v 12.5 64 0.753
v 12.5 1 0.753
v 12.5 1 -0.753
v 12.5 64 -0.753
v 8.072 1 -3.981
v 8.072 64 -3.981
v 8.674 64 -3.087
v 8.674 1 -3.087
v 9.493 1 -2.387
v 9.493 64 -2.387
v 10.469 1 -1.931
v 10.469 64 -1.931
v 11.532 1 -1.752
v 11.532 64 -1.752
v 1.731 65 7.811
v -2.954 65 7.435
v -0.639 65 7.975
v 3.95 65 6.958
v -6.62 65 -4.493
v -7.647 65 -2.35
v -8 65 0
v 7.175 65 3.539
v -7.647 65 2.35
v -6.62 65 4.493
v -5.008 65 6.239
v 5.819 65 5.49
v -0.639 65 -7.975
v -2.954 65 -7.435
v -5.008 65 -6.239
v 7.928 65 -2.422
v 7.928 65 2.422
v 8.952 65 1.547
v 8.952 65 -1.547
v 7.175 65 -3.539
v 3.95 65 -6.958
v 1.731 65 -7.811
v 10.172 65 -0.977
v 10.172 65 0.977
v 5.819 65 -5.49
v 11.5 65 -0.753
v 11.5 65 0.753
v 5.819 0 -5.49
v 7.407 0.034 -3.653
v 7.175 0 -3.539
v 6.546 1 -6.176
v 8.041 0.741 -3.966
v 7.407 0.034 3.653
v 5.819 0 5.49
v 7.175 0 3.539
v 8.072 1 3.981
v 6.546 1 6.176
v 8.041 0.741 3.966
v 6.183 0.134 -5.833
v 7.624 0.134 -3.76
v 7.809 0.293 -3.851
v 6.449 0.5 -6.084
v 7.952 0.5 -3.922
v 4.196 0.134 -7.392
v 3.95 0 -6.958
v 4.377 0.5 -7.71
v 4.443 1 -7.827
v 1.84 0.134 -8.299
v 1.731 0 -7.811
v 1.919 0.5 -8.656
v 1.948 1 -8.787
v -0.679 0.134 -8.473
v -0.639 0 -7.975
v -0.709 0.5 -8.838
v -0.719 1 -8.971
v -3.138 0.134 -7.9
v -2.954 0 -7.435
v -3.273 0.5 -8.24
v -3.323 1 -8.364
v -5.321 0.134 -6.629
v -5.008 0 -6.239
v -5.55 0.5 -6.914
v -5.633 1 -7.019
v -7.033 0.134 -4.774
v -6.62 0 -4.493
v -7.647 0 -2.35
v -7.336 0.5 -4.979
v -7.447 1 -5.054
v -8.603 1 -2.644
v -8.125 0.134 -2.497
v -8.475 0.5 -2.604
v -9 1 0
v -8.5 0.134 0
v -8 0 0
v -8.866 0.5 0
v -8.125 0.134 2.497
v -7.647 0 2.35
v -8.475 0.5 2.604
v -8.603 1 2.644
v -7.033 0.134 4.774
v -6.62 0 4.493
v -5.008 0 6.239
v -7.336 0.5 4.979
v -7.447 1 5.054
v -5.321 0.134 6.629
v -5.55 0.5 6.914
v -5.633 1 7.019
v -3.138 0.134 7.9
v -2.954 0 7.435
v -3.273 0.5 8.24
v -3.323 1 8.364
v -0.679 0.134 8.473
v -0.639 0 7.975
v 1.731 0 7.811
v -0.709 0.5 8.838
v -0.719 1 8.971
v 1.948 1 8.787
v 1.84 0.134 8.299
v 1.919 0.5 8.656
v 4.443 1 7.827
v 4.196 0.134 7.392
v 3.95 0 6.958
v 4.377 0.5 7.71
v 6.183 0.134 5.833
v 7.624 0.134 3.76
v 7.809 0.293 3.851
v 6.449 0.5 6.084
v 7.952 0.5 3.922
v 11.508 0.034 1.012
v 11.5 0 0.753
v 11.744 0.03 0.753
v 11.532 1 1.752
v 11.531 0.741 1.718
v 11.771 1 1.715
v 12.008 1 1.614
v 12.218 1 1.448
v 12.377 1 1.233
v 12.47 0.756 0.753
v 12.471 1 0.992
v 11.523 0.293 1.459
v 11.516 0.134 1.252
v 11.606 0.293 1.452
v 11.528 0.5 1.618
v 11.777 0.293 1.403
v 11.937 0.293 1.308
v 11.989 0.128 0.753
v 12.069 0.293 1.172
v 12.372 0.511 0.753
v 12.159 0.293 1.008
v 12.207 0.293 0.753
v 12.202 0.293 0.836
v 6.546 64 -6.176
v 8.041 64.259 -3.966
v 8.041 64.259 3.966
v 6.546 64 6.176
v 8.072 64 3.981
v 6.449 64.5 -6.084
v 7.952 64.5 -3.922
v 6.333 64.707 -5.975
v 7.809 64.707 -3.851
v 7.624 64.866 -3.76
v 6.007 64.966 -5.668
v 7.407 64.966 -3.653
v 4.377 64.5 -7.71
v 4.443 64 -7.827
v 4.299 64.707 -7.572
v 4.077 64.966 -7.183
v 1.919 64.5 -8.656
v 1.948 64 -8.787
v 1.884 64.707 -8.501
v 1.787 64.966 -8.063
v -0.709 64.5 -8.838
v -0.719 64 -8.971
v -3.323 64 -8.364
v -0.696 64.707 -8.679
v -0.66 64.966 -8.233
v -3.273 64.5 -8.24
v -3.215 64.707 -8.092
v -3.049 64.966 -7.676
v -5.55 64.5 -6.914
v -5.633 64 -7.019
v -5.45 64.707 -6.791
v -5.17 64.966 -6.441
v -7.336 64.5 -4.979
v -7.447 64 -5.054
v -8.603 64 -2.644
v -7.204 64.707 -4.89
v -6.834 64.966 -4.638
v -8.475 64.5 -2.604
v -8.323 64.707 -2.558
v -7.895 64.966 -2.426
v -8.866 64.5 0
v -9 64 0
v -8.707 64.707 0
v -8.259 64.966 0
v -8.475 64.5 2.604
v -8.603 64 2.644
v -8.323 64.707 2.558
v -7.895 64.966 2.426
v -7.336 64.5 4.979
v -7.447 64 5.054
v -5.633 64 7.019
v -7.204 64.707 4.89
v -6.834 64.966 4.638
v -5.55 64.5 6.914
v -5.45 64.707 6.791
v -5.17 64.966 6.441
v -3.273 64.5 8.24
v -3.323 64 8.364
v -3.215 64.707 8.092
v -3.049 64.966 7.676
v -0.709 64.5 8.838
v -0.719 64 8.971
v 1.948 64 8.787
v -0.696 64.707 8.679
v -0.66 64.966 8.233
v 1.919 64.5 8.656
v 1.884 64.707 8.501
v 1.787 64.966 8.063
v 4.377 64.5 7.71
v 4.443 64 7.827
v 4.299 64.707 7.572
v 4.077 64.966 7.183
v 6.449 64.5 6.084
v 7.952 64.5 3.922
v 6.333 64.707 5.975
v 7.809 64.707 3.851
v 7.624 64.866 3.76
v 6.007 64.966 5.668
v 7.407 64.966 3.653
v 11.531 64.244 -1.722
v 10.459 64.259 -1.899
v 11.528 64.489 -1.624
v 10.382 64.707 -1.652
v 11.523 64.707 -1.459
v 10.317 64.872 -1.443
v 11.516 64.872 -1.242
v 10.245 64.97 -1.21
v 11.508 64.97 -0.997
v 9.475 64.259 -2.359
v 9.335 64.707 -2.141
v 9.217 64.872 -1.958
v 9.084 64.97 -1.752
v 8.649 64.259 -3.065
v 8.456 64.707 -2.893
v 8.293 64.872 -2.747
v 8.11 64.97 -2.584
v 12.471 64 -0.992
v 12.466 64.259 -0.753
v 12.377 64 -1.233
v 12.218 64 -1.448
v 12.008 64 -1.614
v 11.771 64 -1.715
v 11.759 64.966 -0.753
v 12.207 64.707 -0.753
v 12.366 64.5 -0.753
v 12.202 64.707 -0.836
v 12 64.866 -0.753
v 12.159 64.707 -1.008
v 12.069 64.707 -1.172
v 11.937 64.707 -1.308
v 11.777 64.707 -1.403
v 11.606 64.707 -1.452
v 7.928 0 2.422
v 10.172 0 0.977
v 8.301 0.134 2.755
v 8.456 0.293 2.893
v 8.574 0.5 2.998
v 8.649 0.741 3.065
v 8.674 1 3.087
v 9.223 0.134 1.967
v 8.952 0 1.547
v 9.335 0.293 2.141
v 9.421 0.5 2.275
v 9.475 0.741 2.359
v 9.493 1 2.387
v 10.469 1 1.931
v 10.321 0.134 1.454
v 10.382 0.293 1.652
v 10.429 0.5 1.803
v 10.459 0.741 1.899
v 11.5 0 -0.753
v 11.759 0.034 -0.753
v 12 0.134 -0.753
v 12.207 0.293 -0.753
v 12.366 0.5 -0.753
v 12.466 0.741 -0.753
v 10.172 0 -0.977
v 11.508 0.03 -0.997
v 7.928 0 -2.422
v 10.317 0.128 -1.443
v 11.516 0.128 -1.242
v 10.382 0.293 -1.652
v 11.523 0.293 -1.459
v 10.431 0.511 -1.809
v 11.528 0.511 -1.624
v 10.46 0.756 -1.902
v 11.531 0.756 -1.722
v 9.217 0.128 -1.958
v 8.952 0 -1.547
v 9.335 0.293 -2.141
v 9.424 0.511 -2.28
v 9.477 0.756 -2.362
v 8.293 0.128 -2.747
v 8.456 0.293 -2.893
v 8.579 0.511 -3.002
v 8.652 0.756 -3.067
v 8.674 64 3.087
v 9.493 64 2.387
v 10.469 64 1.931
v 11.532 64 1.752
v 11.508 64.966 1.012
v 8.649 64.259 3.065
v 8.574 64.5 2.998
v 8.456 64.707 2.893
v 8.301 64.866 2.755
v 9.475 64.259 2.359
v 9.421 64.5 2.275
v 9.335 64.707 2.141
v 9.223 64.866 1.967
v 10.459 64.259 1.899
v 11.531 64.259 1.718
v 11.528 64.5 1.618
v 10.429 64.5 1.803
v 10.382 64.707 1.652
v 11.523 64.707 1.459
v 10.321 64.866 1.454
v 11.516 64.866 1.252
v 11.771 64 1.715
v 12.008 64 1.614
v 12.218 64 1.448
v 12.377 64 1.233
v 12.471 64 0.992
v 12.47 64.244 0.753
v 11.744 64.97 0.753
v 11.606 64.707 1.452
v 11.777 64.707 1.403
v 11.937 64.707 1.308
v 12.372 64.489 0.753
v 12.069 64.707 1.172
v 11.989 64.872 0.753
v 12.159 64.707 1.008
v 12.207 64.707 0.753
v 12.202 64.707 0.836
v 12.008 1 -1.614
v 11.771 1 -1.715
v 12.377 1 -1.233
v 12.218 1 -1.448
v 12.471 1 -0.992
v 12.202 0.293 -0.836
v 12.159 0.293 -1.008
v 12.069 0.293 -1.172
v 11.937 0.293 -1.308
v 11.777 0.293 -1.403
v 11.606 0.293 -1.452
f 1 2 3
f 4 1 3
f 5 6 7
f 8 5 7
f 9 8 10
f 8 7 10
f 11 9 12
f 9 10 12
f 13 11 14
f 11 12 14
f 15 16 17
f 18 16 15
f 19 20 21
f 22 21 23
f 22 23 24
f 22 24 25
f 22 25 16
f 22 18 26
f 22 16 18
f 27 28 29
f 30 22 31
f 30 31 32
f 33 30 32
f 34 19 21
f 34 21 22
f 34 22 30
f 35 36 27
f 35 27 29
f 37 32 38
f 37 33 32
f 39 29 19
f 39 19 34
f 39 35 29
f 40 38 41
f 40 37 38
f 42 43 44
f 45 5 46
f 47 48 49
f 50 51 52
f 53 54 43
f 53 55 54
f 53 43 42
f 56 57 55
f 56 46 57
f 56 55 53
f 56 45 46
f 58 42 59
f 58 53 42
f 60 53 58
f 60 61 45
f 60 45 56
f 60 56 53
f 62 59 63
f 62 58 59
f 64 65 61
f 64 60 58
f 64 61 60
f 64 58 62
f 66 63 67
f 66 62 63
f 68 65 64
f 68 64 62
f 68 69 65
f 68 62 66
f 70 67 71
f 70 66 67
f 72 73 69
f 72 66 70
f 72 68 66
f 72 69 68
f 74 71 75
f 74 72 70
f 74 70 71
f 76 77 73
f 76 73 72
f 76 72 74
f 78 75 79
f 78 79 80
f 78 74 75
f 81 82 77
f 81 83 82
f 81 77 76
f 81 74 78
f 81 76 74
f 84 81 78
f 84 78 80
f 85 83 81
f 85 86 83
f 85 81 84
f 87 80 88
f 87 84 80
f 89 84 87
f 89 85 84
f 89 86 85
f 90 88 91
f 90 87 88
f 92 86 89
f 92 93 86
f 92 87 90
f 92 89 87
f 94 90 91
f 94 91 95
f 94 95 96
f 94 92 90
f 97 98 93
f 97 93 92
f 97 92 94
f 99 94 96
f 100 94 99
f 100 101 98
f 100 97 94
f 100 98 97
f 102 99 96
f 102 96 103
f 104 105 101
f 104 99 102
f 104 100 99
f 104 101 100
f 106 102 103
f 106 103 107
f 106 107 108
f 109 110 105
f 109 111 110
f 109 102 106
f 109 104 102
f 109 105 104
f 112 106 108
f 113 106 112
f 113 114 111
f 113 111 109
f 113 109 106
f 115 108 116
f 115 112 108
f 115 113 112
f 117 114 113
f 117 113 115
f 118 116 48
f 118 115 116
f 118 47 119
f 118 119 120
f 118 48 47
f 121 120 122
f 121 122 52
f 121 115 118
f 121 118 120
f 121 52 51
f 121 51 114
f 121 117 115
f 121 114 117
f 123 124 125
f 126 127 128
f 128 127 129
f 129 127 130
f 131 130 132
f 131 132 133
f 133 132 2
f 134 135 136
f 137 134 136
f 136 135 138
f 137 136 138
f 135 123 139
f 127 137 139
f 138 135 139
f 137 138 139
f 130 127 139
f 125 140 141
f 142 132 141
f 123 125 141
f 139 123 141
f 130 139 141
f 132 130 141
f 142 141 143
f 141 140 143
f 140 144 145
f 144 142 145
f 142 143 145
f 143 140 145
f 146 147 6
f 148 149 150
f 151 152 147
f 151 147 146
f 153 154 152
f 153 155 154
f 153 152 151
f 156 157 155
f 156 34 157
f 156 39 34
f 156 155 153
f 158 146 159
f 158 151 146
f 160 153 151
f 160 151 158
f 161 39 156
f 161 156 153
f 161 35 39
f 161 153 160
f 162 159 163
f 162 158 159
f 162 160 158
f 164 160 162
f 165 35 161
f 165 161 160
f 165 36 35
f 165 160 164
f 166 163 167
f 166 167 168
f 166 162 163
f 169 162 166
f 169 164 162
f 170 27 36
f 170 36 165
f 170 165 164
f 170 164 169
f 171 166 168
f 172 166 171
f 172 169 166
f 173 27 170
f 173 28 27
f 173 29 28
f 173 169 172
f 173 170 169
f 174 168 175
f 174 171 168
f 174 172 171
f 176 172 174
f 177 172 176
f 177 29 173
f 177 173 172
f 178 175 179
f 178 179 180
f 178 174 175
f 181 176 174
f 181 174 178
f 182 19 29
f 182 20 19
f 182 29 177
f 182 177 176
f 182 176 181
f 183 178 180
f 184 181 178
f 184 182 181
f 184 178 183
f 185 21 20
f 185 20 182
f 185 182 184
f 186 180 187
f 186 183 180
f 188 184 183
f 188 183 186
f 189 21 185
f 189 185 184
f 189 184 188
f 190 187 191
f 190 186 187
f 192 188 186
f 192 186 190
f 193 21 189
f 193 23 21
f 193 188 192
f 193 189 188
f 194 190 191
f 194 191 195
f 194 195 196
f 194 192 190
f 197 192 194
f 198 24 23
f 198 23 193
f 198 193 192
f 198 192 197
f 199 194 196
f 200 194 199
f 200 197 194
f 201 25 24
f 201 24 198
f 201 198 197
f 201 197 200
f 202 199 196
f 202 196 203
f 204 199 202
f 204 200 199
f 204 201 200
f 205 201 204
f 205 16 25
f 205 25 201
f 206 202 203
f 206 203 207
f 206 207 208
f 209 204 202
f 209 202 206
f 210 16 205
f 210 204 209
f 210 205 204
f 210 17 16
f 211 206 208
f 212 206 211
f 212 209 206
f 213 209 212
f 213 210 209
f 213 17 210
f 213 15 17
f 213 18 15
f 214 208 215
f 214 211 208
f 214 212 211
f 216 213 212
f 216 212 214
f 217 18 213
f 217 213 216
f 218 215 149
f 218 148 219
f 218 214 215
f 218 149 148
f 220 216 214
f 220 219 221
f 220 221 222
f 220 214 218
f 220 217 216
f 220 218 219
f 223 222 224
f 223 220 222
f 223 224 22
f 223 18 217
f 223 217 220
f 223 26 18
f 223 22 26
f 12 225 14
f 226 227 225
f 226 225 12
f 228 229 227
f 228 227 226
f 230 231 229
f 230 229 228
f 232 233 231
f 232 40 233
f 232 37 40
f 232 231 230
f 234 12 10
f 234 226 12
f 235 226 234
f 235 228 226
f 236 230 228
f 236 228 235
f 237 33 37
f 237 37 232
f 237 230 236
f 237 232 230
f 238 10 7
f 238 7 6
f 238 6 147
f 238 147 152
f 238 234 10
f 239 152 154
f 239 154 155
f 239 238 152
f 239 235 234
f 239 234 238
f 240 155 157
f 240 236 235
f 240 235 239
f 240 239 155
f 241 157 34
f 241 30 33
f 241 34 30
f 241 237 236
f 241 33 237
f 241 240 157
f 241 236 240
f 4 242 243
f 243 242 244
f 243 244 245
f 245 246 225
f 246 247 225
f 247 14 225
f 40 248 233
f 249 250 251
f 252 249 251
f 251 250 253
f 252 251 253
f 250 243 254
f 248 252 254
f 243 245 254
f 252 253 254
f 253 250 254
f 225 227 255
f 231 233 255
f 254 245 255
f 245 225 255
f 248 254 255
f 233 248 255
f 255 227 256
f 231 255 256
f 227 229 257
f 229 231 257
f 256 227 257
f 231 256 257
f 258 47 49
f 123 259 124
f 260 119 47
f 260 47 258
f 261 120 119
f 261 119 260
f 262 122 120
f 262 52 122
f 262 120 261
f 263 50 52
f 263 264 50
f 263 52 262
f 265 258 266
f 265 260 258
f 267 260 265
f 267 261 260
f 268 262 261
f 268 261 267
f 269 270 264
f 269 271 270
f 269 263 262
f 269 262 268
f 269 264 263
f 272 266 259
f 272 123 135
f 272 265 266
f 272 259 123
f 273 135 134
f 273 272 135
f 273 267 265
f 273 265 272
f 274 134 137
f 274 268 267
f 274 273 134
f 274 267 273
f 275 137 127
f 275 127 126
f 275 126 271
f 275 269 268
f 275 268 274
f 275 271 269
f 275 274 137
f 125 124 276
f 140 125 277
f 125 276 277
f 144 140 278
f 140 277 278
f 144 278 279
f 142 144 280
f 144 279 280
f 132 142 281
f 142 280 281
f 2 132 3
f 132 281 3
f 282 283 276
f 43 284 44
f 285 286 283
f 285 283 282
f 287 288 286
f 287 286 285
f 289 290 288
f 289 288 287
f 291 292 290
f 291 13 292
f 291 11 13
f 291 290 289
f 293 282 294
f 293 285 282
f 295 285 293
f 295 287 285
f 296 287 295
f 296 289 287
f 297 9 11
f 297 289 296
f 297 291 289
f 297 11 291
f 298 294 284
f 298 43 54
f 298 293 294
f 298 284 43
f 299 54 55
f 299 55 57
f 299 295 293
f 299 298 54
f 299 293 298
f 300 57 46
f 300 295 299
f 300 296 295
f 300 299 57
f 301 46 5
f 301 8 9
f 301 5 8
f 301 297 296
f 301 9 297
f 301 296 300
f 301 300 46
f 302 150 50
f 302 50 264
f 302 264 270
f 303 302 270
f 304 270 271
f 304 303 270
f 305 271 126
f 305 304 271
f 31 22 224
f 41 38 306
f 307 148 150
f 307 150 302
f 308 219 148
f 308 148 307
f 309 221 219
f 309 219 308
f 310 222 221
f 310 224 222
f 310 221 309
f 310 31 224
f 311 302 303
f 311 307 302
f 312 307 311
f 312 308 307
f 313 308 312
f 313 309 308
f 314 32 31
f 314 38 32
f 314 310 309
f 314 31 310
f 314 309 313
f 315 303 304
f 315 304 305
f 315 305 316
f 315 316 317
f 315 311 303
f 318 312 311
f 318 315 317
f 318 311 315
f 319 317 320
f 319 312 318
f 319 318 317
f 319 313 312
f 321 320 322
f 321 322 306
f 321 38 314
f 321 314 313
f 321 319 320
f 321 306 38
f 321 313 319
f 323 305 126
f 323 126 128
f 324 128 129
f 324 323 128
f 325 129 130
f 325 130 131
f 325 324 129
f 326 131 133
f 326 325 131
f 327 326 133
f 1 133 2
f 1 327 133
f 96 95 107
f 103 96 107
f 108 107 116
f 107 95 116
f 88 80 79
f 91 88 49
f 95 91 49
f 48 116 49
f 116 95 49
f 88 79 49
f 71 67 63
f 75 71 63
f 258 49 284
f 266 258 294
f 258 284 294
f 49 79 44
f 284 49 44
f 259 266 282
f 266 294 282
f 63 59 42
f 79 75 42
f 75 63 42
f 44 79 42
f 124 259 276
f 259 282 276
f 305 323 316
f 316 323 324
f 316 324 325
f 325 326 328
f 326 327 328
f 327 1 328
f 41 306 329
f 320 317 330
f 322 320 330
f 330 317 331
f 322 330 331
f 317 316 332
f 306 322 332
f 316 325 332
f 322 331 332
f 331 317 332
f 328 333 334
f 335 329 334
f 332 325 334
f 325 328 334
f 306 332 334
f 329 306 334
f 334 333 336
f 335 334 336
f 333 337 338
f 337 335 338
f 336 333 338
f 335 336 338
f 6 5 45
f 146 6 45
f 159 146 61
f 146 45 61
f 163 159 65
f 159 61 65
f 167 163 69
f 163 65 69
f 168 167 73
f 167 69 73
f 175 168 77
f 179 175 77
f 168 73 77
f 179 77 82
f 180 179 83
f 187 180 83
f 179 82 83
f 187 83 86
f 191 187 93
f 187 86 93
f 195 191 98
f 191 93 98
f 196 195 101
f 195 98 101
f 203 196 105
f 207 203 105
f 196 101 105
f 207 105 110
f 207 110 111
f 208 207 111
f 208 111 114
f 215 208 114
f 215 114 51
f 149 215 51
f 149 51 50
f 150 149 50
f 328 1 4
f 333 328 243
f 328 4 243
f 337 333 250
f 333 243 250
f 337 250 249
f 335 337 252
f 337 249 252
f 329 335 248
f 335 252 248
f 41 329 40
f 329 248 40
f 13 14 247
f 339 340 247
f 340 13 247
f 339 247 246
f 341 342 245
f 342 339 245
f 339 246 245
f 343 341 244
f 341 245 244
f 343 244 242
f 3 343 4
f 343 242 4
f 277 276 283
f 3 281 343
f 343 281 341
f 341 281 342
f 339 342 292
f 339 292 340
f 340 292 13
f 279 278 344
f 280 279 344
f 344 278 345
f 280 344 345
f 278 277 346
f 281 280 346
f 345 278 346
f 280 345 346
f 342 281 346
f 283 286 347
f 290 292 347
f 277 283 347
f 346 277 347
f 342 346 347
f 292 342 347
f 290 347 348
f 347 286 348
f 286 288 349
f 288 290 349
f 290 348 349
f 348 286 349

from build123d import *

# Parameters (mm, degrees)
EXTRUDE_1_DEPTH = 65
FILLET_1_R      = 4
FILLET_2_R      = 1
FILLET_3_R      = 1


with BuildPart() as part:
    # 草图1 → 凸台-拉伸1 (new body)
    with BuildSketch(Plane(origin=(0, 0, 0), x_dir=(1, 0, 0), z_dir=(0, 1, 0))):
        with BuildLine():
            Line((5.896241987, -1.75), (5.896241987, 1.75))
            Line((5.896241987, 1.75), (8.828221792, 1.75))
            ThreePointArc((8.828221792, 1.75), (-9, 0), (8.828221792, -1.75))
            Line((8.828221792, -1.75), (5.896241987, -1.75))
        make_face()
        with BuildLine():
            Line((8.828221792, 1.75), (5.896241987, 1.75))
            Line((5.896241987, 1.75), (5.896241987, -1.75))
            Line((5.896241987, -1.75), (8.828221792, -1.75))
            ThreePointArc((8.828221792, -1.75), (8.956952499, -0.879205288), (9, 0))
            ThreePointArc((9, 0), (8.956952499, 0.879205288), (8.828221792, 1.75))
        make_face()
        with BuildLine():
            Line((12.5, 1.75), (8.828221792, 1.75))
            ThreePointArc((8.828221792, 1.75), (8.956952499, 0.879205288), (9, 0))
            ThreePointArc((9, 0), (8.956952499, -0.879205288), (8.828221792, -1.75))
            Line((8.828221792, -1.75), (12.5, -1.75))
            Line((12.5, -1.75), (12.5, 1.75))
        make_face()
    extrude(amount=EXTRUDE_1_DEPTH)

    # 圆角1
    fillet_1_edges = [part.edges().sort_by_distance(p)[0] for p in [
        (8.828221792, 32.5, -1.75),
        (8.828221792, 32.5, 1.75),
    ]]
    fillet(fillet_1_edges, radius=FILLET_1_R)

    # 圆角2
    fillet_2_edges = [part.edges().sort_by_distance(p)[0] for p in [
        (12.5, 32.5, 1.75),
        (12.5, 32.5, -1.75),
    ]]
    fillet(fillet_2_edges, radius=FILLET_2_R)

    # 圆角3
    fillet_3_edges = [part.edges().sort_by_distance(p)[0] for p in [
        (-9, 0, 0),
        (-9, 65, 0),
        (9.493163732, 0, -2.387235704),
        (9.493163732, 65, 2.387235704),
        (12.5, 0, 0),
        (12.5, 65, 0),
        (9.493163732, 0, 2.387235704),
        (12.218277371, 0, -1.448292733),
        (12.218277371, 0, 1.448292733),
        (9.493163732, 65, -2.387235704),
        (12.218277371, 65, -1.448292733),
        (12.218277371, 65, 1.448292733),
    ]]
    fillet(fillet_3_edges, radius=FILLET_3_R - 0.0004)  # a hair under: the kernel refuses the full size


solid = part.part
